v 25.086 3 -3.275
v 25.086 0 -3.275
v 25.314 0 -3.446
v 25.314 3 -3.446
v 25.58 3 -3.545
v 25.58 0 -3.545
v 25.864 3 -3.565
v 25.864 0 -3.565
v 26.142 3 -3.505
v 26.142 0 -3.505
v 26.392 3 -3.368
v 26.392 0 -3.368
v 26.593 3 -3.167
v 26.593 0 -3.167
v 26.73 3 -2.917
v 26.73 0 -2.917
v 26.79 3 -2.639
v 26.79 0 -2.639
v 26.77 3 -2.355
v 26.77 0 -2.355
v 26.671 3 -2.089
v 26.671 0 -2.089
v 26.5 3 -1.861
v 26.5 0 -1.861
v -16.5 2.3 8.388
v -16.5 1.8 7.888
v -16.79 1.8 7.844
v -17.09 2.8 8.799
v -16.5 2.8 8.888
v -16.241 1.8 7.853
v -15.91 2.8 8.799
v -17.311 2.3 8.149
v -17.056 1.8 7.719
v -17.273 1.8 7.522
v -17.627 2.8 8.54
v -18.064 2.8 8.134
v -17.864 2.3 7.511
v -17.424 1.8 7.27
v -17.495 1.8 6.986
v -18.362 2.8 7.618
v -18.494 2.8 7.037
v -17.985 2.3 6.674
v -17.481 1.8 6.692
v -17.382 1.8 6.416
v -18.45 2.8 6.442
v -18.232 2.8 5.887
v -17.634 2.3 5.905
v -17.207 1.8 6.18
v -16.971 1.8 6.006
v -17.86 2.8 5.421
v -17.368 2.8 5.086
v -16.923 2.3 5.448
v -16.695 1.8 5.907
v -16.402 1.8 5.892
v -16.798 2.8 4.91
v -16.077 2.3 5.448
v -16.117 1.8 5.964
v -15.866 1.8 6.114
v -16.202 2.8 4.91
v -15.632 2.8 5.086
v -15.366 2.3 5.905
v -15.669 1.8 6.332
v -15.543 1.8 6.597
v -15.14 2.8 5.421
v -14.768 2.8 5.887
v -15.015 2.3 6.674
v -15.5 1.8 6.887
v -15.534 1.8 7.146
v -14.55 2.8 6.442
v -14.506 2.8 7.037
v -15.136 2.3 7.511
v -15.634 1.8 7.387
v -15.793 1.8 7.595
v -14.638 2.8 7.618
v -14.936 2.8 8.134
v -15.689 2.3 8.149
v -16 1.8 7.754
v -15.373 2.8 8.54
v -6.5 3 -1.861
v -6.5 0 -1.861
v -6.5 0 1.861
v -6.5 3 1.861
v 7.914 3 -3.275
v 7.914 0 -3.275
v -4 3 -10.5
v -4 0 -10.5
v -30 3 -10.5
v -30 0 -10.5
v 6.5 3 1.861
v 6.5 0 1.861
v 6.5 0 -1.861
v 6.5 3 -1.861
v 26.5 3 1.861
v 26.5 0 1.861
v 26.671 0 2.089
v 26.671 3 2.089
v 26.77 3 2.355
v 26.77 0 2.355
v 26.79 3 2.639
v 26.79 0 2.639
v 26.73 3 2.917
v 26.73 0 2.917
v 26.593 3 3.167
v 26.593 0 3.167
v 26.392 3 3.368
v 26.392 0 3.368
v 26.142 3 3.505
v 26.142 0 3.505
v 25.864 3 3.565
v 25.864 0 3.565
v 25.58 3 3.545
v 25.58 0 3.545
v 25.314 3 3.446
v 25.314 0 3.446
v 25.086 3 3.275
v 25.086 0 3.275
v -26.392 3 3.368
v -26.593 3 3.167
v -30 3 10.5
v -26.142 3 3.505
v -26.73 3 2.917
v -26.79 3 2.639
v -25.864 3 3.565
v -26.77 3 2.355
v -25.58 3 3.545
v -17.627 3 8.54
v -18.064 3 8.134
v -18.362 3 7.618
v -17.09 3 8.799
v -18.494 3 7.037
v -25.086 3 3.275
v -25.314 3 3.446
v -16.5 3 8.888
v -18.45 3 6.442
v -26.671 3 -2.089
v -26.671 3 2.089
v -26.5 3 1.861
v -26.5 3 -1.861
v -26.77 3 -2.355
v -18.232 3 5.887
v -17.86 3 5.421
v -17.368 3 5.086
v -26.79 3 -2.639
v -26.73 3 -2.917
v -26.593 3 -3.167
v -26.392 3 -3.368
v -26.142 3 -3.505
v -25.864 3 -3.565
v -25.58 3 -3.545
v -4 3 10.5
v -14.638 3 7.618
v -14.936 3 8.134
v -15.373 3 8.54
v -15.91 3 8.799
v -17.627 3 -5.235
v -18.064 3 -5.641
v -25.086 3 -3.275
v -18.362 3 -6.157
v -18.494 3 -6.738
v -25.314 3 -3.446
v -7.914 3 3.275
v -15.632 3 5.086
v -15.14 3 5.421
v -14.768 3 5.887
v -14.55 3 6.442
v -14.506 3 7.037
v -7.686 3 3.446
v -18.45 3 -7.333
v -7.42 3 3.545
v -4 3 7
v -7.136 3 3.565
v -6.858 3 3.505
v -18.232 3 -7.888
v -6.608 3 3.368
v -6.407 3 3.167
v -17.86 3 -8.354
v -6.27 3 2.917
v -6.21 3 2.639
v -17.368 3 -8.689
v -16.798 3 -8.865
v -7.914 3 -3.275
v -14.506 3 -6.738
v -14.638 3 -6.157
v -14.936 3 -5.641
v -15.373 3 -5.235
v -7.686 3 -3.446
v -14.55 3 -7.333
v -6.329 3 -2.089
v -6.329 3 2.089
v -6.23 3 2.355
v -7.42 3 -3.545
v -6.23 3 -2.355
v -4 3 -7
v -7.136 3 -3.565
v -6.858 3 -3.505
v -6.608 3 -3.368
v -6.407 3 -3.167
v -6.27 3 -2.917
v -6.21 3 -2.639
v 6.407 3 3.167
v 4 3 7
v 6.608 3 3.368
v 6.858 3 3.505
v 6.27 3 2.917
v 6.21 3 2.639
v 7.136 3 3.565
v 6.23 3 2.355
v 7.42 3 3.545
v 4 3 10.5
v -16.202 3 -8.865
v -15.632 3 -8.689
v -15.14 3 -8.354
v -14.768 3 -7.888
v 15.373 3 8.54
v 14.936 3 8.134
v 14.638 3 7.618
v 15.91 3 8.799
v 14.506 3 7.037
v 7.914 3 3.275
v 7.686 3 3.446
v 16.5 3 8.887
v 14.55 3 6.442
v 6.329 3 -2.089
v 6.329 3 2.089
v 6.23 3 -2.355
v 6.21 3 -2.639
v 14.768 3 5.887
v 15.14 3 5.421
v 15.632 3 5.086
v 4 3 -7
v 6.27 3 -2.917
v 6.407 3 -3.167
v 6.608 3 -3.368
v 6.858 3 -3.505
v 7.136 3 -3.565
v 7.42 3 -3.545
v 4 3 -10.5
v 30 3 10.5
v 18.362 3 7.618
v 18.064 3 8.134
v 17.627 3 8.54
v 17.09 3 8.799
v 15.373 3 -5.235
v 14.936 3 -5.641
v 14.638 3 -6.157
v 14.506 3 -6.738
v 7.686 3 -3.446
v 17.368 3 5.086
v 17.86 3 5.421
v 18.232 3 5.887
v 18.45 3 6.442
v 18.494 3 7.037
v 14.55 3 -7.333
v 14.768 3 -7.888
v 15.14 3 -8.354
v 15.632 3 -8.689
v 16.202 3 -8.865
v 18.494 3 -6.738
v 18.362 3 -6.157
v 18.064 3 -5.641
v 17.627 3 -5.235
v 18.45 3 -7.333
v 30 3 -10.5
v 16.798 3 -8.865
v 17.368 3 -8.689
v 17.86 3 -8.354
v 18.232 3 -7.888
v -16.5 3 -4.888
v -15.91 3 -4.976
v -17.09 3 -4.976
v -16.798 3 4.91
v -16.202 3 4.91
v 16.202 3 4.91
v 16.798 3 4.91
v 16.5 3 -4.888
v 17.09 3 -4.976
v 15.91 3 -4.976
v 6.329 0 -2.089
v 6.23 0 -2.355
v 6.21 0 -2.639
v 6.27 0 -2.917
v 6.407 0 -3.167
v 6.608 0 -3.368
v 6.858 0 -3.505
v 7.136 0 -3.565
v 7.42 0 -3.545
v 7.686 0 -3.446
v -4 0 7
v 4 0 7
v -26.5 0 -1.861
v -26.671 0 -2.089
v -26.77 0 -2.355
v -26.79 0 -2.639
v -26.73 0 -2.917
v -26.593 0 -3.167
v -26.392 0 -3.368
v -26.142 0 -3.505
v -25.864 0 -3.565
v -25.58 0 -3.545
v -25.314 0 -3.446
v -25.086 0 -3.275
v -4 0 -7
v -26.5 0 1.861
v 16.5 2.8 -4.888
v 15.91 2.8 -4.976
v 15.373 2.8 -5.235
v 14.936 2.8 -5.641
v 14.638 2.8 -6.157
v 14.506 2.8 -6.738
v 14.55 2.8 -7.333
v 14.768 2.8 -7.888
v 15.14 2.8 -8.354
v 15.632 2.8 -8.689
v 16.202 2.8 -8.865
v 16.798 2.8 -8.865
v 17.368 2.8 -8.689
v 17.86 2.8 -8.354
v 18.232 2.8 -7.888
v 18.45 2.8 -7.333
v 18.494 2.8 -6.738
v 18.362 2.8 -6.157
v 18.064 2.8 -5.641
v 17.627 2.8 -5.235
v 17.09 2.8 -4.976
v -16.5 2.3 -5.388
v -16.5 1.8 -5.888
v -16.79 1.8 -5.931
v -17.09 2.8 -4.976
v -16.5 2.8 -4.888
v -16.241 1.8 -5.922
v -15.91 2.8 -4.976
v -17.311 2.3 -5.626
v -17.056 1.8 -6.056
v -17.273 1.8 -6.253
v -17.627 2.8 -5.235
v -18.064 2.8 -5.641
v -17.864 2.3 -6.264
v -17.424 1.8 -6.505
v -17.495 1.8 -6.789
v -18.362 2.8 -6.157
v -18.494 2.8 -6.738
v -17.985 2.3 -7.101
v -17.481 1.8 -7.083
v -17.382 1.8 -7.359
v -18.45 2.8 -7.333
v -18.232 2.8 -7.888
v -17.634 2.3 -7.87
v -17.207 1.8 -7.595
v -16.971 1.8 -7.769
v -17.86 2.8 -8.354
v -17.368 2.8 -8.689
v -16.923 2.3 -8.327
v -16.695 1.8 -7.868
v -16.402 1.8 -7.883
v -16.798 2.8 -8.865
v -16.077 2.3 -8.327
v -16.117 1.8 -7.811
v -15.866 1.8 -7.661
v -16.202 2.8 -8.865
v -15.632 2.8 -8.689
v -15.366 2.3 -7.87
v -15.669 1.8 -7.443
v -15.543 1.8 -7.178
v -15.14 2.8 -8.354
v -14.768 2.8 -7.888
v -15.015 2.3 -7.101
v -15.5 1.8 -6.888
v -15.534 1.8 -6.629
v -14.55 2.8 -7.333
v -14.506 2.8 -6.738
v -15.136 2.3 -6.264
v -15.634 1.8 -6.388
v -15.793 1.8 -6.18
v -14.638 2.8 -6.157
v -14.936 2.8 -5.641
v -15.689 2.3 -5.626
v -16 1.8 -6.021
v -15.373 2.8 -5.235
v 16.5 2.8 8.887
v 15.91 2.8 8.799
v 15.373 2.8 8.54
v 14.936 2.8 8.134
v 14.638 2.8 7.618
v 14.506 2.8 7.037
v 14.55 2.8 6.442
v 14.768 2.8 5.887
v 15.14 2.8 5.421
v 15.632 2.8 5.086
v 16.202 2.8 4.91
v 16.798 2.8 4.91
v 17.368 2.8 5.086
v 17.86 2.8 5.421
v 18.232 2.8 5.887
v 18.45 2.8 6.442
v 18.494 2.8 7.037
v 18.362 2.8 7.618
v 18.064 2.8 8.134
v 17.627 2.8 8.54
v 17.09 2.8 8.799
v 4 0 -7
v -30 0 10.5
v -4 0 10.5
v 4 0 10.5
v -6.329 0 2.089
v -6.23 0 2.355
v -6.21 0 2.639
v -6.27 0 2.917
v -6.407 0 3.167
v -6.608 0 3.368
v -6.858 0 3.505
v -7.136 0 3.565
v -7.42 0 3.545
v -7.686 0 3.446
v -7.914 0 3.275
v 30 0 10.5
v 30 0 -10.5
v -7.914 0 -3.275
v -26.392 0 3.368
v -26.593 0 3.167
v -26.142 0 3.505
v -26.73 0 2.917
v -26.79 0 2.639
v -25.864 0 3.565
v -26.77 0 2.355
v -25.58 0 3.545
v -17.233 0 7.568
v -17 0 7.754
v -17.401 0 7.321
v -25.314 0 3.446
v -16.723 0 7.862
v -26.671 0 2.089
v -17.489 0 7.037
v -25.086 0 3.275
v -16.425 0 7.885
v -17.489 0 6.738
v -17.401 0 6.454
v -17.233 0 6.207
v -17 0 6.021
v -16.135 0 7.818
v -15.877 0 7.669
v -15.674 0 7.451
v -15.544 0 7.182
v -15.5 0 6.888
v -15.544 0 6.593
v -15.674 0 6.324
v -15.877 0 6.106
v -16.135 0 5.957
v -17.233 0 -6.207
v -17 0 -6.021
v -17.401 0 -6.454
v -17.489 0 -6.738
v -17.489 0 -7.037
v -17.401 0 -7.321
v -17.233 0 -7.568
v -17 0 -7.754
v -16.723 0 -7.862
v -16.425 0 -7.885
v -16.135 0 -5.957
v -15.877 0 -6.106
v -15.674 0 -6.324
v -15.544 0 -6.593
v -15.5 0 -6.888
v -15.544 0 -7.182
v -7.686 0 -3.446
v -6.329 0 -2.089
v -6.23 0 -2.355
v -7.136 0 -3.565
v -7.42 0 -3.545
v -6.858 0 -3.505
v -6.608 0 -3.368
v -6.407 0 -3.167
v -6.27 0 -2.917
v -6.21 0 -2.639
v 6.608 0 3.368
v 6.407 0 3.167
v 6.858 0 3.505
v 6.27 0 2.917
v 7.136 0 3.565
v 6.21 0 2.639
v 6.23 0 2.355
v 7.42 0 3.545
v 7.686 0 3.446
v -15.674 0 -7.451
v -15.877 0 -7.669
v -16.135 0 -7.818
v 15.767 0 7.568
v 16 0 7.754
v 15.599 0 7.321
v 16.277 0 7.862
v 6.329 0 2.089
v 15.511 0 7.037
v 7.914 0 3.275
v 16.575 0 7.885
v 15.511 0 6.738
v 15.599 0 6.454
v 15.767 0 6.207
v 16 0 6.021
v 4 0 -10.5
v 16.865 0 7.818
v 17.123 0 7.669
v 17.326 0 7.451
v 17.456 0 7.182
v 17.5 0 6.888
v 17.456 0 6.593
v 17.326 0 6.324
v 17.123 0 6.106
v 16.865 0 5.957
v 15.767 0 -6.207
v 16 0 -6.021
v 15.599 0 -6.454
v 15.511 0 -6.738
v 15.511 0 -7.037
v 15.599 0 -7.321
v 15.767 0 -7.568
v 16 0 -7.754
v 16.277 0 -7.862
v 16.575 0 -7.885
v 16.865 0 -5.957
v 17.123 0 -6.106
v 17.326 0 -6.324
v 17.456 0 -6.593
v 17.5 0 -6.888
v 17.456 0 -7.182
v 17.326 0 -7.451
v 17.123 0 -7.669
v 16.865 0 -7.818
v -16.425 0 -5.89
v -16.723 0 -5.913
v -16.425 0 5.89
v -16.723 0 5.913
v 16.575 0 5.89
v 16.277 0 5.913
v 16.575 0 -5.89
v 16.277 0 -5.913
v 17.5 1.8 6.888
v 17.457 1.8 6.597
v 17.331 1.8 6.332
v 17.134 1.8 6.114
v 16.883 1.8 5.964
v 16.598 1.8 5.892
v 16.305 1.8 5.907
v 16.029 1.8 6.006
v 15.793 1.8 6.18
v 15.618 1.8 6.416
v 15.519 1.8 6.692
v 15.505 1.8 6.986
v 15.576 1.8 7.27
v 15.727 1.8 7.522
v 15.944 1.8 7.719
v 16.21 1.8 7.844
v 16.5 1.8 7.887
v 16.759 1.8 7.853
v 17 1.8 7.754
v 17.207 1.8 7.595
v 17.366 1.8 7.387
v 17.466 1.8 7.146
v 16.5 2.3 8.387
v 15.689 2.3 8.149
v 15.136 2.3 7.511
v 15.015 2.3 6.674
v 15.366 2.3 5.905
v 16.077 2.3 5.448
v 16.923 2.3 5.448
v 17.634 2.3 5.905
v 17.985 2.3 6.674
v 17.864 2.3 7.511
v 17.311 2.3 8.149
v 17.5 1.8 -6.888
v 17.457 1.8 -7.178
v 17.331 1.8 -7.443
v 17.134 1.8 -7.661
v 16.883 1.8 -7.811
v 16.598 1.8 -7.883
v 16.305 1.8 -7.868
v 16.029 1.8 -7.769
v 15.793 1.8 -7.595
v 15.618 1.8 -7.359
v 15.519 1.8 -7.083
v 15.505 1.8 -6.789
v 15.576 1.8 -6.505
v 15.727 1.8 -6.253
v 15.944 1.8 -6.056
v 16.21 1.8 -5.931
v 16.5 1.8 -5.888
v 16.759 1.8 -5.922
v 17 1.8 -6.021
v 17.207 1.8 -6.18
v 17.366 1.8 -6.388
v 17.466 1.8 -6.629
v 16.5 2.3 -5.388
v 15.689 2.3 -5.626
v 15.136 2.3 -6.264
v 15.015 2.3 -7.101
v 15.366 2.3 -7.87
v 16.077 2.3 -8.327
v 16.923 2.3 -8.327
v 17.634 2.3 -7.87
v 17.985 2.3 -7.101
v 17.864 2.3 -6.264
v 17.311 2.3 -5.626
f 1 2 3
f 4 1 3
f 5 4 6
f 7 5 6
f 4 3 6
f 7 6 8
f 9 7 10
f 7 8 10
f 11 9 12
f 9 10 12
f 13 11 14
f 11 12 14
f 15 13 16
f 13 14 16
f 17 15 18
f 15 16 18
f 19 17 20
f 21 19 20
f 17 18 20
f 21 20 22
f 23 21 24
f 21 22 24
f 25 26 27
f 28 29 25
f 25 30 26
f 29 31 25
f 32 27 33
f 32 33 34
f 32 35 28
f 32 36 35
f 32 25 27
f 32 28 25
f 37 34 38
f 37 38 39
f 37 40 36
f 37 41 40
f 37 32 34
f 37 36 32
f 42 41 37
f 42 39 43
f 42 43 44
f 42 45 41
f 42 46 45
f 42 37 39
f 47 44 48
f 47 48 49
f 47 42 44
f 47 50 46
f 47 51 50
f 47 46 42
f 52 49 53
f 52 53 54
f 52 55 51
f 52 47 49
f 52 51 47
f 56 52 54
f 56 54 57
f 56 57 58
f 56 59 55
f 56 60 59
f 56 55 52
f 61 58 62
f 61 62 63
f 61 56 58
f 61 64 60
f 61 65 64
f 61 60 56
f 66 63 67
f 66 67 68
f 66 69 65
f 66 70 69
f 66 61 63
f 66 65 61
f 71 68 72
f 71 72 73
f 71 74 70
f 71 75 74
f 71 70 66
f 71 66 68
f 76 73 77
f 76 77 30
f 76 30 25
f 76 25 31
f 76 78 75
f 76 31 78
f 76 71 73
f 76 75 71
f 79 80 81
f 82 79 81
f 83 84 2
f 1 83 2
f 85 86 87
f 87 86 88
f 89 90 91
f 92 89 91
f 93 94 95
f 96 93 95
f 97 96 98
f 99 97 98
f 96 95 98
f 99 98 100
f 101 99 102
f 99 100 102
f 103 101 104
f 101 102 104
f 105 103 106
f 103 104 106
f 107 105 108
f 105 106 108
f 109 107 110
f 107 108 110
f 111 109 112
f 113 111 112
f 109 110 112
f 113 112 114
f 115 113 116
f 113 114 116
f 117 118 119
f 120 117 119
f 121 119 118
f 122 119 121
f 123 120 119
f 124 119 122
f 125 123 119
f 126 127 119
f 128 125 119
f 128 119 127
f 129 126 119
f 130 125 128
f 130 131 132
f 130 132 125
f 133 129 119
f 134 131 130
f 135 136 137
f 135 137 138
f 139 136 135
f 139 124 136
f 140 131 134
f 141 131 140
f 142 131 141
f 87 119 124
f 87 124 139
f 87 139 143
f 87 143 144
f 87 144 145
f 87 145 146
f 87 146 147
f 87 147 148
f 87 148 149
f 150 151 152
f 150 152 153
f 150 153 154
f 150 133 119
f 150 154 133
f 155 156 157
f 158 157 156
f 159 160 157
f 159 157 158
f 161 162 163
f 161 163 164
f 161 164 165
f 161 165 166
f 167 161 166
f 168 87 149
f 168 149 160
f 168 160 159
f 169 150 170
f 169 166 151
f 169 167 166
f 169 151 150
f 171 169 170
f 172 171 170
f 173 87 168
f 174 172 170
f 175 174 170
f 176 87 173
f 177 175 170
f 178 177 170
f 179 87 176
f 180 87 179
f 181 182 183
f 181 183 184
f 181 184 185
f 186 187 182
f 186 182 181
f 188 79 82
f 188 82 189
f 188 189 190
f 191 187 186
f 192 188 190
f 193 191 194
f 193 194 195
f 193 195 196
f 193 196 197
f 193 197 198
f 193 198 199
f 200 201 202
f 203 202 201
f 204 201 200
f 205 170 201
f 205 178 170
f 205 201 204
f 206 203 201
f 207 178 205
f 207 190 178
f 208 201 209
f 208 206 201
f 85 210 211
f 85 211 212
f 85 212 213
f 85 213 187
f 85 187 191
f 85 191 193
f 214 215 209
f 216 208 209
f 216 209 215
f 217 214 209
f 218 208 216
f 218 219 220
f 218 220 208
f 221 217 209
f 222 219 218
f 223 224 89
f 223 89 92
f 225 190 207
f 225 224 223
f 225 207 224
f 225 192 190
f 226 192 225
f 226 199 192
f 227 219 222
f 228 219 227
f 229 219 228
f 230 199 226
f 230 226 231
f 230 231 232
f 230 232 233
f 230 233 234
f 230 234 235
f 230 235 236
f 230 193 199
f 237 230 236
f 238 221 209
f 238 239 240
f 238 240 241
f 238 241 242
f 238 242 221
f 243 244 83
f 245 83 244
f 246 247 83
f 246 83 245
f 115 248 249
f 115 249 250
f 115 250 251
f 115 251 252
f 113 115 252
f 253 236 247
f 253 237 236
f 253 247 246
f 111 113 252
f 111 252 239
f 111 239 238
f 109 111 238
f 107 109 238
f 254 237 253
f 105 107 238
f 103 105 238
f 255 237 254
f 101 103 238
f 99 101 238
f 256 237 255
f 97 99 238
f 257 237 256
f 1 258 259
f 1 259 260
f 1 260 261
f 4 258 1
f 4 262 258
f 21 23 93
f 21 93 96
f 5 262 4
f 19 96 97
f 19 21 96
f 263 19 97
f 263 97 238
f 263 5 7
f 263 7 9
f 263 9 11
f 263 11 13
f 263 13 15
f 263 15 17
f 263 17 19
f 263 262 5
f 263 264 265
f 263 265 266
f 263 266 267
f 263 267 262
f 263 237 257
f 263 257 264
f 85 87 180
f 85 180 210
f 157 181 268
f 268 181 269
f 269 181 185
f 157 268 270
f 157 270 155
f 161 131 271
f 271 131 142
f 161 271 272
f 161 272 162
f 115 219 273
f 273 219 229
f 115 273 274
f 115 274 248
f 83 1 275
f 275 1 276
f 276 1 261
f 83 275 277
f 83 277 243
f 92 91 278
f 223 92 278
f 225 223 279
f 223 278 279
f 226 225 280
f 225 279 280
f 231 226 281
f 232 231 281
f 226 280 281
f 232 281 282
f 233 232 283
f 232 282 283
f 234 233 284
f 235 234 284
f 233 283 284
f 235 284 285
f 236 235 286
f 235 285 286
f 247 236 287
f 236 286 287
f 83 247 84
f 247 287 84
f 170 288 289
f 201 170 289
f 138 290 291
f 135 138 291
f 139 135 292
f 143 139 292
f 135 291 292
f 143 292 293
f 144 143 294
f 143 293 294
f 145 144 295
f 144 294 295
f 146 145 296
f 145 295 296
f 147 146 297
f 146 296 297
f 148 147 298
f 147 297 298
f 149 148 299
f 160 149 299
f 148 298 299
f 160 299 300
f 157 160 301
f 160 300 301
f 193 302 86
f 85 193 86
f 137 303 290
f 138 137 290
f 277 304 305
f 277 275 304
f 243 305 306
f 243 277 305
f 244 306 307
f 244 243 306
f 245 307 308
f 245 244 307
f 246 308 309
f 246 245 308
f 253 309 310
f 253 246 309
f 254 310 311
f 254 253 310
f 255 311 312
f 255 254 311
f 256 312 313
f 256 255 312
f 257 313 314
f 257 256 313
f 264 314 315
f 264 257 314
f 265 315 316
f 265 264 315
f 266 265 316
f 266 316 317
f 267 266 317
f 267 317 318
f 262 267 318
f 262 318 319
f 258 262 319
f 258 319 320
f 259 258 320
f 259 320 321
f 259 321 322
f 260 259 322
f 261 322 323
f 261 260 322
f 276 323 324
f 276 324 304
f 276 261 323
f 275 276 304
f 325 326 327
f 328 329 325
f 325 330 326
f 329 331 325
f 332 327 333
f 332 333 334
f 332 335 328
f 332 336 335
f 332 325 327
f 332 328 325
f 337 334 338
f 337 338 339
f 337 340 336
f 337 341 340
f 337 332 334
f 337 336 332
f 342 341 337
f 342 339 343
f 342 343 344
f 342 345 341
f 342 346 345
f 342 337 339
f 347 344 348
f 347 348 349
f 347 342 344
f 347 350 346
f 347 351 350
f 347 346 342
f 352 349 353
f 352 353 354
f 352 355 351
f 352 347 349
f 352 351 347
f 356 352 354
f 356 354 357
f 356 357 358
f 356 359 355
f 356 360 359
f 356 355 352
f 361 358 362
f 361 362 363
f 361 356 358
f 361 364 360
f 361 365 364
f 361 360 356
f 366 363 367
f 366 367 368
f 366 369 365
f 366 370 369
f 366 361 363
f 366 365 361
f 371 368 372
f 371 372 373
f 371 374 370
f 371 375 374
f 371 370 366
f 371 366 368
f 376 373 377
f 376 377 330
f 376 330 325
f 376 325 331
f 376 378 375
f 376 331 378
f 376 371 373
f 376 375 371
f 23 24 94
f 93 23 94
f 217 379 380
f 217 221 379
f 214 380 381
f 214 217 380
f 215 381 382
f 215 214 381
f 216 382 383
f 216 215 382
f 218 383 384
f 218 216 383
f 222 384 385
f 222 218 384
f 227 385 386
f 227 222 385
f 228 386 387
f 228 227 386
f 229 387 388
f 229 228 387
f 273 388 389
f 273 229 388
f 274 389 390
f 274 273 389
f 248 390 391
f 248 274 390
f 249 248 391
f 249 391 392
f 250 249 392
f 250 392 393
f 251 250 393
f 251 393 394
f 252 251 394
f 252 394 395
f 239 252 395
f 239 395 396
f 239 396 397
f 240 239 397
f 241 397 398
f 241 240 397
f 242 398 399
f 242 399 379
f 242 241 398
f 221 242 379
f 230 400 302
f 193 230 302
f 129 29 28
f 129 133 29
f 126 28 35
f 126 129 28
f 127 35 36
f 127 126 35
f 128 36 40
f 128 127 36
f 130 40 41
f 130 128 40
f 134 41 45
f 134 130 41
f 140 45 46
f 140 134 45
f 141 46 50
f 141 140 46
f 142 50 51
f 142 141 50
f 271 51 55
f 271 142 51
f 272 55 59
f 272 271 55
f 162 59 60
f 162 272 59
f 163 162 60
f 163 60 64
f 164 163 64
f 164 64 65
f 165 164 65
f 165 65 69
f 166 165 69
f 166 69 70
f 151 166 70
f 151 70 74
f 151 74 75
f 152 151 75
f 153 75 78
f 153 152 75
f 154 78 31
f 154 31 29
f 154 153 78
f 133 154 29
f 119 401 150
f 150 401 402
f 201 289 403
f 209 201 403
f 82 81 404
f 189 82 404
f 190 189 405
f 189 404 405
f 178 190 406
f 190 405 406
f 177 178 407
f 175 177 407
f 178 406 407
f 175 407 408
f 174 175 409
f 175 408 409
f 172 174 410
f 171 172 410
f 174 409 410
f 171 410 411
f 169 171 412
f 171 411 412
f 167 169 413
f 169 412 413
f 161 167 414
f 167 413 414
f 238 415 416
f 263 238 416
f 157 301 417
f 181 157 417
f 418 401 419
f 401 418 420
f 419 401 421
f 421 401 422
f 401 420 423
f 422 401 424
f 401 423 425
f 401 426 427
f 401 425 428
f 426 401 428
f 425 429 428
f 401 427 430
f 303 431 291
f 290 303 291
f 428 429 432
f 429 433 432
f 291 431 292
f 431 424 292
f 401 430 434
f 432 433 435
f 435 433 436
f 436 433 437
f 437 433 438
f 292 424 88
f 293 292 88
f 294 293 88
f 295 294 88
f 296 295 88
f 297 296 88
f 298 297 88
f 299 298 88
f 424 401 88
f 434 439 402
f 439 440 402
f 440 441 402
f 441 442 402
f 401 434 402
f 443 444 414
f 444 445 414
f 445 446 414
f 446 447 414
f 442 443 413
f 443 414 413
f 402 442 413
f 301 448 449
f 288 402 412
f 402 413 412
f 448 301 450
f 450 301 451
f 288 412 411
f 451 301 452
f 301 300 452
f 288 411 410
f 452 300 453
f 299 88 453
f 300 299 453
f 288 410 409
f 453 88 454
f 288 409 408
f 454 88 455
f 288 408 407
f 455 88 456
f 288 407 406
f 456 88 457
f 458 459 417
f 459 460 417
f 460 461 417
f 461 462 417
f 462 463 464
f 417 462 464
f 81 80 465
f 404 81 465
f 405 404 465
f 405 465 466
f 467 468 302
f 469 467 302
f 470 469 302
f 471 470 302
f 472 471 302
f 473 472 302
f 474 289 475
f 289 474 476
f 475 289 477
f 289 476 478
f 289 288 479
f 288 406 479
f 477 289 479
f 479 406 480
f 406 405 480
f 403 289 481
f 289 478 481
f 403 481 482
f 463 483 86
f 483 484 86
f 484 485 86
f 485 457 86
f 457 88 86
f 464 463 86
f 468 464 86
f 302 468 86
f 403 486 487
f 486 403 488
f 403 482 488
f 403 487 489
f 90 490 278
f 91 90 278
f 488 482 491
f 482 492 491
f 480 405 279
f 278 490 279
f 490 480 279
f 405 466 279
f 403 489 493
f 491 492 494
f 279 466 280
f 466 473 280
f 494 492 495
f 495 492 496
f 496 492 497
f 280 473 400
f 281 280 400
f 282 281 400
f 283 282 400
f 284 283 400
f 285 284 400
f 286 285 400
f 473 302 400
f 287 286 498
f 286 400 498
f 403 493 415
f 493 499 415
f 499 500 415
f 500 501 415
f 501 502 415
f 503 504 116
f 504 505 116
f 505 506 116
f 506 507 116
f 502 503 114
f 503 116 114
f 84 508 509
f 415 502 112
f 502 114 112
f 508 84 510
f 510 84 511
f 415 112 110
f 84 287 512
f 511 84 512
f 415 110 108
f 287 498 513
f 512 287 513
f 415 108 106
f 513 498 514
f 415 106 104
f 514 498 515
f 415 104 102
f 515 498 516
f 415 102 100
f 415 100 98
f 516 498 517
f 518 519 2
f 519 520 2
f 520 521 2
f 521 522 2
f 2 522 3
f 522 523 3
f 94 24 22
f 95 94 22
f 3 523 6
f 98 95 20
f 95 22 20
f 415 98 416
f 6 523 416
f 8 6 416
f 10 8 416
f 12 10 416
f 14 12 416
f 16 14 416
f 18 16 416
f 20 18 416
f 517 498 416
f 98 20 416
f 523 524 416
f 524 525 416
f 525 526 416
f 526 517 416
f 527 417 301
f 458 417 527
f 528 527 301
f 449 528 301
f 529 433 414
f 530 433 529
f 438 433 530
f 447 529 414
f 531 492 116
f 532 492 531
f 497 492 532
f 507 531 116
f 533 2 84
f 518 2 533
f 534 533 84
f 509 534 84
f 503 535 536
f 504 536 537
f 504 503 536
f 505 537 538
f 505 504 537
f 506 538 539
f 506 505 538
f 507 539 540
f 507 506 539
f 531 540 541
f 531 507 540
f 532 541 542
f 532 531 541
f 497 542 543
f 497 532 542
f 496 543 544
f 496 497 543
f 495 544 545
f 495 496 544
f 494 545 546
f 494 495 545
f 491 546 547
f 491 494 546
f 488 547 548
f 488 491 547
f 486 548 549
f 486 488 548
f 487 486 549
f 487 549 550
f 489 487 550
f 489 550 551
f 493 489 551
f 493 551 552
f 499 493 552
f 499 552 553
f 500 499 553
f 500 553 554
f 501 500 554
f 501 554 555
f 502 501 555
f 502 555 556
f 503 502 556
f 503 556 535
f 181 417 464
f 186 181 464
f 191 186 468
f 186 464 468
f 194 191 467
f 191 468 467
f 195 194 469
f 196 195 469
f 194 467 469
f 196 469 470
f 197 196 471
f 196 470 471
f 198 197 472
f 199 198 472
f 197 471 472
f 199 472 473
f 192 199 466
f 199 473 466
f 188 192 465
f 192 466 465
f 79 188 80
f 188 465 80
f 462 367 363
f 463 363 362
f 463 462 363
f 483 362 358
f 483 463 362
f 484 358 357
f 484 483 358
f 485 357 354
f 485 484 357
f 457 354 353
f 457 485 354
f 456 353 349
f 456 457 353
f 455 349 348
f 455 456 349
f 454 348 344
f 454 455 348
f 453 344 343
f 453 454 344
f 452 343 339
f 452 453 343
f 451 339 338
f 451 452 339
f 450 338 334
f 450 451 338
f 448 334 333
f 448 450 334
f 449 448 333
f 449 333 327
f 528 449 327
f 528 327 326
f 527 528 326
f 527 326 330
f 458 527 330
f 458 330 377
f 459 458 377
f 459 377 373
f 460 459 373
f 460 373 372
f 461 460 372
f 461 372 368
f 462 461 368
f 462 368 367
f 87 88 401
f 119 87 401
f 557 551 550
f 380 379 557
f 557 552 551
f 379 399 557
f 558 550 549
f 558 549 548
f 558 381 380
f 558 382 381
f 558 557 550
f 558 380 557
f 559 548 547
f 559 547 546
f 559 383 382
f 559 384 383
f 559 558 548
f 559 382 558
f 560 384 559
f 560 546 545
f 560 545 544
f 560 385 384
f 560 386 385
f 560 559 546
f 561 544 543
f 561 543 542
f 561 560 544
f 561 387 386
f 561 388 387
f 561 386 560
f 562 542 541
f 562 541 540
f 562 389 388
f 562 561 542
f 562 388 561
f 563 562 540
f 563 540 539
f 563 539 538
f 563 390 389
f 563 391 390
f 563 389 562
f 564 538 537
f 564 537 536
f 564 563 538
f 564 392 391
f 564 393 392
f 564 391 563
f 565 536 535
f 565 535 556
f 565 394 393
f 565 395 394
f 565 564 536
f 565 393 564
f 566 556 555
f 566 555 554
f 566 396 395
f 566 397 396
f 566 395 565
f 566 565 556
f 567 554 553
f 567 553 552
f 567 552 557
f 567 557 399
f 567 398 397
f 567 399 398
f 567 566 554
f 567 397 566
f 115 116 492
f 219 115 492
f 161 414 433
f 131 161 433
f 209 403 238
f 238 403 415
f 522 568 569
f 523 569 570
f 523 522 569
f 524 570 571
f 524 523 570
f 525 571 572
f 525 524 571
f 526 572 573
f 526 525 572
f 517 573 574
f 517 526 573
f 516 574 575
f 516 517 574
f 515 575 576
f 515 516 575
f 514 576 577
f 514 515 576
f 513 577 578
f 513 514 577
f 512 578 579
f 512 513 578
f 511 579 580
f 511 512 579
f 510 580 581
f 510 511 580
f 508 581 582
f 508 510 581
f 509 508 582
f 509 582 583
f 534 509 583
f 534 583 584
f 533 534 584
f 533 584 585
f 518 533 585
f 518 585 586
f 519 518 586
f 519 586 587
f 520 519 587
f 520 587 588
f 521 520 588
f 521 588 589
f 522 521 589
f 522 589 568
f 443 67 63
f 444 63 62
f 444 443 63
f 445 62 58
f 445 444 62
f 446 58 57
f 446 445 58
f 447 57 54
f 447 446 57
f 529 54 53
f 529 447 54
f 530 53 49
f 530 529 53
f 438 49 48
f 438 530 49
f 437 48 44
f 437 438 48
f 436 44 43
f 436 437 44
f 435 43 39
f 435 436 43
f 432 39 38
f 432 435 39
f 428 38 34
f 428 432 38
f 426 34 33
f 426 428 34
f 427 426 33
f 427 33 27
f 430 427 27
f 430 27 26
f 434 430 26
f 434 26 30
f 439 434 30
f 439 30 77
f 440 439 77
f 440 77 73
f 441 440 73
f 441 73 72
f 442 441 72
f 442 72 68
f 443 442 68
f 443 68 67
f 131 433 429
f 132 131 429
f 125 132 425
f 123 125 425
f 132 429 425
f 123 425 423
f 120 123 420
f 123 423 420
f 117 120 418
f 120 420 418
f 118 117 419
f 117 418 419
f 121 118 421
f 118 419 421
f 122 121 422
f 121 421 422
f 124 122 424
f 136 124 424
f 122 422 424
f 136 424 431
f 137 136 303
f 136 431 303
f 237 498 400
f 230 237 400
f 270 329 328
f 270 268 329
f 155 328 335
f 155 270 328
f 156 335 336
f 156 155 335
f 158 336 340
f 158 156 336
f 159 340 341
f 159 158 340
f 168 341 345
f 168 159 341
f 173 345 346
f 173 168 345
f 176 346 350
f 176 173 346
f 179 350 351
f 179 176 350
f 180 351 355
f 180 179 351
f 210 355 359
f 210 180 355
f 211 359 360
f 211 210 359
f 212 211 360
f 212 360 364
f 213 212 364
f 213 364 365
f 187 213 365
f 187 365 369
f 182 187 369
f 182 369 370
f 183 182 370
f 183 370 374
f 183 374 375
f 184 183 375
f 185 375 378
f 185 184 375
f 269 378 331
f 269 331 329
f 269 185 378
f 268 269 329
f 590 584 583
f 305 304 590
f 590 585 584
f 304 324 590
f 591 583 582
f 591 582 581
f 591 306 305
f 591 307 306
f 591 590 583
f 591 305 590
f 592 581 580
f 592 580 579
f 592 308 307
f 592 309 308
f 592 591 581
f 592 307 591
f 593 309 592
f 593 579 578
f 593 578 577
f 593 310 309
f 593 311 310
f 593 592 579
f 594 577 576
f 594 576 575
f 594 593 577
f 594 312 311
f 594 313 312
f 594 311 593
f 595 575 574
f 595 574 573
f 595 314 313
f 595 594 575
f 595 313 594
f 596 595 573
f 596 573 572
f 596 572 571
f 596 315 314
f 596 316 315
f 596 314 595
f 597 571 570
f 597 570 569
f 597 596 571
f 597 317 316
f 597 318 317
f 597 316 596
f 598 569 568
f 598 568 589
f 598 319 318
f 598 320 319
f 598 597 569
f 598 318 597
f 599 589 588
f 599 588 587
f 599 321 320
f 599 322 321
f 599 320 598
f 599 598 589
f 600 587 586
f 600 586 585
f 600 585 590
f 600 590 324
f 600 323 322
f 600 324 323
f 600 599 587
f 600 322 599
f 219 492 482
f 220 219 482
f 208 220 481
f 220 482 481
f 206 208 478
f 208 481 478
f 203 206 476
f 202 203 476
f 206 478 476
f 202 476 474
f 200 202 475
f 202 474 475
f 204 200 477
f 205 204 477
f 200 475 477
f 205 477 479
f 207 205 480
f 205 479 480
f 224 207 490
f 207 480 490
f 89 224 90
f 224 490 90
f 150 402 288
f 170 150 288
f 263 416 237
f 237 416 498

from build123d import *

# Parameters (mm, degrees)
SKETCH1_R                                      = 1
BOSS_EXTRUDE1_DEPTH                            = 3
CSK_FOR_M2_FLAT_HEAD_MACHINE_SCREW1_AT_2_COUNT = 2
CSK_FOR_M2_FLAT_HEAD_MACHINE_SCREW1_AT_2_PITCH = 13.775
CSK_FOR_M2_FLAT_HEAD_MACHINE_SCREW1_AT_3_COUNT = 2
CSK_FOR_M2_FLAT_HEAD_MACHINE_SCREW1_AT_3_PITCH = 33
CSK_FOR_M2_FLAT_HEAD_MACHINE_SCREW1_AT_4_COUNT = 2
CSK_FOR_M2_FLAT_HEAD_MACHINE_SCREW1_AT_4_PITCH = 35.759622831


with BuildPart() as part:
    # Sketch1 → Boss-Extrude1 (new body)
    with BuildSketch(Plane(origin=(0, 0, 0), x_dir=(1, 0, 0), z_dir=(0, 1, 0))):
        Polygon((-30, 10.5), (-30, -10.5), (-4, -10.5), (-4, -7), (4, -7), (4, -10.5), (30, -10.5), (30, 10.5), (4, 10.5), (4, 7), (-4, 7), (-4, 10.5), align=None)
        with Locations((16.5, -6.8875)):
            Circle(SKETCH1_R, mode=Mode.SUBTRACT)
        with Locations((-16.5, -6.8875)):
            Circle(SKETCH1_R, mode=Mode.SUBTRACT)
        with Locations((-16.5, 6.8875)):
            Circle(SKETCH1_R, mode=Mode.SUBTRACT)
        with BuildLine():
            Line((-25.085786438, 3.275), (-7.914213562, 3.275))
            ThreePointArc((-7.914213562, 3.275), (-6.5, 3.275), (-6.5, 1.860786438))
            Line((-6.5, 1.860786438), (-6.5, -1.860786438))
            ThreePointArc((-6.5, -1.860786438), (-6.5, -3.275), (-7.914213562, -3.275))
            Line((-7.914213562, -3.275), (-25.085786438, -3.275))
            ThreePointArc((-25.085786438, -3.275), (-26.5, -3.275), (-26.5, -1.860786438))
            Line((-26.5, -1.860786438), (-26.5, 1.860786438))
            ThreePointArc((-26.5, 1.860786438), (-26.5, 3.275), (-25.085786438, 3.275))
        make_face(mode=Mode.SUBTRACT)
        with Locations((16.5, 6.8875)):
            Circle(SKETCH1_R, mode=Mode.SUBTRACT)
        with BuildLine():
            Line((26.5, 1.860786438), (26.5, -1.860786438))
            ThreePointArc((26.5, -1.860786438), (26.5, -3.275), (25.085786438, -3.275))
            Line((25.085786438, -3.275), (7.914213562, -3.275))
            ThreePointArc((7.914213562, -3.275), (6.5, -3.275), (6.5, -1.860786438))
            Line((6.5, -1.860786438), (6.5, 1.860786438))
            ThreePointArc((6.5, 1.860786438), (6.5, 3.275), (7.914213562, 3.275))
            Line((7.914213562, 3.275), (25.085786438, 3.275))
            ThreePointArc((25.085786438, 3.275), (26.5, 3.275), (26.5, 1.860786438))
        make_face(mode=Mode.SUBTRACT)
    extrude(amount=BOSS_EXTRUDE1_DEPTH)

    # Sketch3 → CSK for M2 Flat Head Machine Screw1 (revolve, cut)
    with BuildSketch(Plane(origin=(-16.5, 3, -6.8875), x_dir=(0, 0, 1), z_dir=(1, 0, 0))):
        Polygon((0, 0), (0, 3), (1, 3), (1, 1.2), (2, 0.2), (2, 0), align=None)
    csk_for_m2_flat_head_machine_screw1 = revolve(axis=Axis((-16.5, 9.35, -6.8875), (0, -1, 0)), mode=Mode.SUBTRACT)

    # CSK for M2 Flat Head Machine Screw1 at 2: CSK for M2 Flat Head Machine Screw1 ×2
    with Locations(*[(0, 0, i * CSK_FOR_M2_FLAT_HEAD_MACHINE_SCREW1_AT_2_PITCH) for i in range(1, CSK_FOR_M2_FLAT_HEAD_MACHINE_SCREW1_AT_2_COUNT)]):
        add(csk_for_m2_flat_head_machine_screw1, mode=Mode.SUBTRACT)

    # CSK for M2 Flat Head Machine Screw1 at 3: CSK for M2 Flat Head Machine Screw1 ×2
    with Locations(*[(i * CSK_FOR_M2_FLAT_HEAD_MACHINE_SCREW1_AT_3_PITCH, 0, 0) for i in range(1, CSK_FOR_M2_FLAT_HEAD_MACHINE_SCREW1_AT_3_COUNT)]):
        add(csk_for_m2_flat_head_machine_screw1, mode=Mode.SUBTRACT)

    # CSK for M2 Flat Head Machine Screw1 at 4: CSK for M2 Flat Head Machine Screw1 ×2
    with Locations(*[Vector(0.922828525, 0, 0.385210998) * (i * CSK_FOR_M2_FLAT_HEAD_MACHINE_SCREW1_AT_4_PITCH) for i in range(1, CSK_FOR_M2_FLAT_HEAD_MACHINE_SCREW1_AT_4_COUNT)]):
        add(csk_for_m2_flat_head_machine_screw1, mode=Mode.SUBTRACT)


solid = part.part
